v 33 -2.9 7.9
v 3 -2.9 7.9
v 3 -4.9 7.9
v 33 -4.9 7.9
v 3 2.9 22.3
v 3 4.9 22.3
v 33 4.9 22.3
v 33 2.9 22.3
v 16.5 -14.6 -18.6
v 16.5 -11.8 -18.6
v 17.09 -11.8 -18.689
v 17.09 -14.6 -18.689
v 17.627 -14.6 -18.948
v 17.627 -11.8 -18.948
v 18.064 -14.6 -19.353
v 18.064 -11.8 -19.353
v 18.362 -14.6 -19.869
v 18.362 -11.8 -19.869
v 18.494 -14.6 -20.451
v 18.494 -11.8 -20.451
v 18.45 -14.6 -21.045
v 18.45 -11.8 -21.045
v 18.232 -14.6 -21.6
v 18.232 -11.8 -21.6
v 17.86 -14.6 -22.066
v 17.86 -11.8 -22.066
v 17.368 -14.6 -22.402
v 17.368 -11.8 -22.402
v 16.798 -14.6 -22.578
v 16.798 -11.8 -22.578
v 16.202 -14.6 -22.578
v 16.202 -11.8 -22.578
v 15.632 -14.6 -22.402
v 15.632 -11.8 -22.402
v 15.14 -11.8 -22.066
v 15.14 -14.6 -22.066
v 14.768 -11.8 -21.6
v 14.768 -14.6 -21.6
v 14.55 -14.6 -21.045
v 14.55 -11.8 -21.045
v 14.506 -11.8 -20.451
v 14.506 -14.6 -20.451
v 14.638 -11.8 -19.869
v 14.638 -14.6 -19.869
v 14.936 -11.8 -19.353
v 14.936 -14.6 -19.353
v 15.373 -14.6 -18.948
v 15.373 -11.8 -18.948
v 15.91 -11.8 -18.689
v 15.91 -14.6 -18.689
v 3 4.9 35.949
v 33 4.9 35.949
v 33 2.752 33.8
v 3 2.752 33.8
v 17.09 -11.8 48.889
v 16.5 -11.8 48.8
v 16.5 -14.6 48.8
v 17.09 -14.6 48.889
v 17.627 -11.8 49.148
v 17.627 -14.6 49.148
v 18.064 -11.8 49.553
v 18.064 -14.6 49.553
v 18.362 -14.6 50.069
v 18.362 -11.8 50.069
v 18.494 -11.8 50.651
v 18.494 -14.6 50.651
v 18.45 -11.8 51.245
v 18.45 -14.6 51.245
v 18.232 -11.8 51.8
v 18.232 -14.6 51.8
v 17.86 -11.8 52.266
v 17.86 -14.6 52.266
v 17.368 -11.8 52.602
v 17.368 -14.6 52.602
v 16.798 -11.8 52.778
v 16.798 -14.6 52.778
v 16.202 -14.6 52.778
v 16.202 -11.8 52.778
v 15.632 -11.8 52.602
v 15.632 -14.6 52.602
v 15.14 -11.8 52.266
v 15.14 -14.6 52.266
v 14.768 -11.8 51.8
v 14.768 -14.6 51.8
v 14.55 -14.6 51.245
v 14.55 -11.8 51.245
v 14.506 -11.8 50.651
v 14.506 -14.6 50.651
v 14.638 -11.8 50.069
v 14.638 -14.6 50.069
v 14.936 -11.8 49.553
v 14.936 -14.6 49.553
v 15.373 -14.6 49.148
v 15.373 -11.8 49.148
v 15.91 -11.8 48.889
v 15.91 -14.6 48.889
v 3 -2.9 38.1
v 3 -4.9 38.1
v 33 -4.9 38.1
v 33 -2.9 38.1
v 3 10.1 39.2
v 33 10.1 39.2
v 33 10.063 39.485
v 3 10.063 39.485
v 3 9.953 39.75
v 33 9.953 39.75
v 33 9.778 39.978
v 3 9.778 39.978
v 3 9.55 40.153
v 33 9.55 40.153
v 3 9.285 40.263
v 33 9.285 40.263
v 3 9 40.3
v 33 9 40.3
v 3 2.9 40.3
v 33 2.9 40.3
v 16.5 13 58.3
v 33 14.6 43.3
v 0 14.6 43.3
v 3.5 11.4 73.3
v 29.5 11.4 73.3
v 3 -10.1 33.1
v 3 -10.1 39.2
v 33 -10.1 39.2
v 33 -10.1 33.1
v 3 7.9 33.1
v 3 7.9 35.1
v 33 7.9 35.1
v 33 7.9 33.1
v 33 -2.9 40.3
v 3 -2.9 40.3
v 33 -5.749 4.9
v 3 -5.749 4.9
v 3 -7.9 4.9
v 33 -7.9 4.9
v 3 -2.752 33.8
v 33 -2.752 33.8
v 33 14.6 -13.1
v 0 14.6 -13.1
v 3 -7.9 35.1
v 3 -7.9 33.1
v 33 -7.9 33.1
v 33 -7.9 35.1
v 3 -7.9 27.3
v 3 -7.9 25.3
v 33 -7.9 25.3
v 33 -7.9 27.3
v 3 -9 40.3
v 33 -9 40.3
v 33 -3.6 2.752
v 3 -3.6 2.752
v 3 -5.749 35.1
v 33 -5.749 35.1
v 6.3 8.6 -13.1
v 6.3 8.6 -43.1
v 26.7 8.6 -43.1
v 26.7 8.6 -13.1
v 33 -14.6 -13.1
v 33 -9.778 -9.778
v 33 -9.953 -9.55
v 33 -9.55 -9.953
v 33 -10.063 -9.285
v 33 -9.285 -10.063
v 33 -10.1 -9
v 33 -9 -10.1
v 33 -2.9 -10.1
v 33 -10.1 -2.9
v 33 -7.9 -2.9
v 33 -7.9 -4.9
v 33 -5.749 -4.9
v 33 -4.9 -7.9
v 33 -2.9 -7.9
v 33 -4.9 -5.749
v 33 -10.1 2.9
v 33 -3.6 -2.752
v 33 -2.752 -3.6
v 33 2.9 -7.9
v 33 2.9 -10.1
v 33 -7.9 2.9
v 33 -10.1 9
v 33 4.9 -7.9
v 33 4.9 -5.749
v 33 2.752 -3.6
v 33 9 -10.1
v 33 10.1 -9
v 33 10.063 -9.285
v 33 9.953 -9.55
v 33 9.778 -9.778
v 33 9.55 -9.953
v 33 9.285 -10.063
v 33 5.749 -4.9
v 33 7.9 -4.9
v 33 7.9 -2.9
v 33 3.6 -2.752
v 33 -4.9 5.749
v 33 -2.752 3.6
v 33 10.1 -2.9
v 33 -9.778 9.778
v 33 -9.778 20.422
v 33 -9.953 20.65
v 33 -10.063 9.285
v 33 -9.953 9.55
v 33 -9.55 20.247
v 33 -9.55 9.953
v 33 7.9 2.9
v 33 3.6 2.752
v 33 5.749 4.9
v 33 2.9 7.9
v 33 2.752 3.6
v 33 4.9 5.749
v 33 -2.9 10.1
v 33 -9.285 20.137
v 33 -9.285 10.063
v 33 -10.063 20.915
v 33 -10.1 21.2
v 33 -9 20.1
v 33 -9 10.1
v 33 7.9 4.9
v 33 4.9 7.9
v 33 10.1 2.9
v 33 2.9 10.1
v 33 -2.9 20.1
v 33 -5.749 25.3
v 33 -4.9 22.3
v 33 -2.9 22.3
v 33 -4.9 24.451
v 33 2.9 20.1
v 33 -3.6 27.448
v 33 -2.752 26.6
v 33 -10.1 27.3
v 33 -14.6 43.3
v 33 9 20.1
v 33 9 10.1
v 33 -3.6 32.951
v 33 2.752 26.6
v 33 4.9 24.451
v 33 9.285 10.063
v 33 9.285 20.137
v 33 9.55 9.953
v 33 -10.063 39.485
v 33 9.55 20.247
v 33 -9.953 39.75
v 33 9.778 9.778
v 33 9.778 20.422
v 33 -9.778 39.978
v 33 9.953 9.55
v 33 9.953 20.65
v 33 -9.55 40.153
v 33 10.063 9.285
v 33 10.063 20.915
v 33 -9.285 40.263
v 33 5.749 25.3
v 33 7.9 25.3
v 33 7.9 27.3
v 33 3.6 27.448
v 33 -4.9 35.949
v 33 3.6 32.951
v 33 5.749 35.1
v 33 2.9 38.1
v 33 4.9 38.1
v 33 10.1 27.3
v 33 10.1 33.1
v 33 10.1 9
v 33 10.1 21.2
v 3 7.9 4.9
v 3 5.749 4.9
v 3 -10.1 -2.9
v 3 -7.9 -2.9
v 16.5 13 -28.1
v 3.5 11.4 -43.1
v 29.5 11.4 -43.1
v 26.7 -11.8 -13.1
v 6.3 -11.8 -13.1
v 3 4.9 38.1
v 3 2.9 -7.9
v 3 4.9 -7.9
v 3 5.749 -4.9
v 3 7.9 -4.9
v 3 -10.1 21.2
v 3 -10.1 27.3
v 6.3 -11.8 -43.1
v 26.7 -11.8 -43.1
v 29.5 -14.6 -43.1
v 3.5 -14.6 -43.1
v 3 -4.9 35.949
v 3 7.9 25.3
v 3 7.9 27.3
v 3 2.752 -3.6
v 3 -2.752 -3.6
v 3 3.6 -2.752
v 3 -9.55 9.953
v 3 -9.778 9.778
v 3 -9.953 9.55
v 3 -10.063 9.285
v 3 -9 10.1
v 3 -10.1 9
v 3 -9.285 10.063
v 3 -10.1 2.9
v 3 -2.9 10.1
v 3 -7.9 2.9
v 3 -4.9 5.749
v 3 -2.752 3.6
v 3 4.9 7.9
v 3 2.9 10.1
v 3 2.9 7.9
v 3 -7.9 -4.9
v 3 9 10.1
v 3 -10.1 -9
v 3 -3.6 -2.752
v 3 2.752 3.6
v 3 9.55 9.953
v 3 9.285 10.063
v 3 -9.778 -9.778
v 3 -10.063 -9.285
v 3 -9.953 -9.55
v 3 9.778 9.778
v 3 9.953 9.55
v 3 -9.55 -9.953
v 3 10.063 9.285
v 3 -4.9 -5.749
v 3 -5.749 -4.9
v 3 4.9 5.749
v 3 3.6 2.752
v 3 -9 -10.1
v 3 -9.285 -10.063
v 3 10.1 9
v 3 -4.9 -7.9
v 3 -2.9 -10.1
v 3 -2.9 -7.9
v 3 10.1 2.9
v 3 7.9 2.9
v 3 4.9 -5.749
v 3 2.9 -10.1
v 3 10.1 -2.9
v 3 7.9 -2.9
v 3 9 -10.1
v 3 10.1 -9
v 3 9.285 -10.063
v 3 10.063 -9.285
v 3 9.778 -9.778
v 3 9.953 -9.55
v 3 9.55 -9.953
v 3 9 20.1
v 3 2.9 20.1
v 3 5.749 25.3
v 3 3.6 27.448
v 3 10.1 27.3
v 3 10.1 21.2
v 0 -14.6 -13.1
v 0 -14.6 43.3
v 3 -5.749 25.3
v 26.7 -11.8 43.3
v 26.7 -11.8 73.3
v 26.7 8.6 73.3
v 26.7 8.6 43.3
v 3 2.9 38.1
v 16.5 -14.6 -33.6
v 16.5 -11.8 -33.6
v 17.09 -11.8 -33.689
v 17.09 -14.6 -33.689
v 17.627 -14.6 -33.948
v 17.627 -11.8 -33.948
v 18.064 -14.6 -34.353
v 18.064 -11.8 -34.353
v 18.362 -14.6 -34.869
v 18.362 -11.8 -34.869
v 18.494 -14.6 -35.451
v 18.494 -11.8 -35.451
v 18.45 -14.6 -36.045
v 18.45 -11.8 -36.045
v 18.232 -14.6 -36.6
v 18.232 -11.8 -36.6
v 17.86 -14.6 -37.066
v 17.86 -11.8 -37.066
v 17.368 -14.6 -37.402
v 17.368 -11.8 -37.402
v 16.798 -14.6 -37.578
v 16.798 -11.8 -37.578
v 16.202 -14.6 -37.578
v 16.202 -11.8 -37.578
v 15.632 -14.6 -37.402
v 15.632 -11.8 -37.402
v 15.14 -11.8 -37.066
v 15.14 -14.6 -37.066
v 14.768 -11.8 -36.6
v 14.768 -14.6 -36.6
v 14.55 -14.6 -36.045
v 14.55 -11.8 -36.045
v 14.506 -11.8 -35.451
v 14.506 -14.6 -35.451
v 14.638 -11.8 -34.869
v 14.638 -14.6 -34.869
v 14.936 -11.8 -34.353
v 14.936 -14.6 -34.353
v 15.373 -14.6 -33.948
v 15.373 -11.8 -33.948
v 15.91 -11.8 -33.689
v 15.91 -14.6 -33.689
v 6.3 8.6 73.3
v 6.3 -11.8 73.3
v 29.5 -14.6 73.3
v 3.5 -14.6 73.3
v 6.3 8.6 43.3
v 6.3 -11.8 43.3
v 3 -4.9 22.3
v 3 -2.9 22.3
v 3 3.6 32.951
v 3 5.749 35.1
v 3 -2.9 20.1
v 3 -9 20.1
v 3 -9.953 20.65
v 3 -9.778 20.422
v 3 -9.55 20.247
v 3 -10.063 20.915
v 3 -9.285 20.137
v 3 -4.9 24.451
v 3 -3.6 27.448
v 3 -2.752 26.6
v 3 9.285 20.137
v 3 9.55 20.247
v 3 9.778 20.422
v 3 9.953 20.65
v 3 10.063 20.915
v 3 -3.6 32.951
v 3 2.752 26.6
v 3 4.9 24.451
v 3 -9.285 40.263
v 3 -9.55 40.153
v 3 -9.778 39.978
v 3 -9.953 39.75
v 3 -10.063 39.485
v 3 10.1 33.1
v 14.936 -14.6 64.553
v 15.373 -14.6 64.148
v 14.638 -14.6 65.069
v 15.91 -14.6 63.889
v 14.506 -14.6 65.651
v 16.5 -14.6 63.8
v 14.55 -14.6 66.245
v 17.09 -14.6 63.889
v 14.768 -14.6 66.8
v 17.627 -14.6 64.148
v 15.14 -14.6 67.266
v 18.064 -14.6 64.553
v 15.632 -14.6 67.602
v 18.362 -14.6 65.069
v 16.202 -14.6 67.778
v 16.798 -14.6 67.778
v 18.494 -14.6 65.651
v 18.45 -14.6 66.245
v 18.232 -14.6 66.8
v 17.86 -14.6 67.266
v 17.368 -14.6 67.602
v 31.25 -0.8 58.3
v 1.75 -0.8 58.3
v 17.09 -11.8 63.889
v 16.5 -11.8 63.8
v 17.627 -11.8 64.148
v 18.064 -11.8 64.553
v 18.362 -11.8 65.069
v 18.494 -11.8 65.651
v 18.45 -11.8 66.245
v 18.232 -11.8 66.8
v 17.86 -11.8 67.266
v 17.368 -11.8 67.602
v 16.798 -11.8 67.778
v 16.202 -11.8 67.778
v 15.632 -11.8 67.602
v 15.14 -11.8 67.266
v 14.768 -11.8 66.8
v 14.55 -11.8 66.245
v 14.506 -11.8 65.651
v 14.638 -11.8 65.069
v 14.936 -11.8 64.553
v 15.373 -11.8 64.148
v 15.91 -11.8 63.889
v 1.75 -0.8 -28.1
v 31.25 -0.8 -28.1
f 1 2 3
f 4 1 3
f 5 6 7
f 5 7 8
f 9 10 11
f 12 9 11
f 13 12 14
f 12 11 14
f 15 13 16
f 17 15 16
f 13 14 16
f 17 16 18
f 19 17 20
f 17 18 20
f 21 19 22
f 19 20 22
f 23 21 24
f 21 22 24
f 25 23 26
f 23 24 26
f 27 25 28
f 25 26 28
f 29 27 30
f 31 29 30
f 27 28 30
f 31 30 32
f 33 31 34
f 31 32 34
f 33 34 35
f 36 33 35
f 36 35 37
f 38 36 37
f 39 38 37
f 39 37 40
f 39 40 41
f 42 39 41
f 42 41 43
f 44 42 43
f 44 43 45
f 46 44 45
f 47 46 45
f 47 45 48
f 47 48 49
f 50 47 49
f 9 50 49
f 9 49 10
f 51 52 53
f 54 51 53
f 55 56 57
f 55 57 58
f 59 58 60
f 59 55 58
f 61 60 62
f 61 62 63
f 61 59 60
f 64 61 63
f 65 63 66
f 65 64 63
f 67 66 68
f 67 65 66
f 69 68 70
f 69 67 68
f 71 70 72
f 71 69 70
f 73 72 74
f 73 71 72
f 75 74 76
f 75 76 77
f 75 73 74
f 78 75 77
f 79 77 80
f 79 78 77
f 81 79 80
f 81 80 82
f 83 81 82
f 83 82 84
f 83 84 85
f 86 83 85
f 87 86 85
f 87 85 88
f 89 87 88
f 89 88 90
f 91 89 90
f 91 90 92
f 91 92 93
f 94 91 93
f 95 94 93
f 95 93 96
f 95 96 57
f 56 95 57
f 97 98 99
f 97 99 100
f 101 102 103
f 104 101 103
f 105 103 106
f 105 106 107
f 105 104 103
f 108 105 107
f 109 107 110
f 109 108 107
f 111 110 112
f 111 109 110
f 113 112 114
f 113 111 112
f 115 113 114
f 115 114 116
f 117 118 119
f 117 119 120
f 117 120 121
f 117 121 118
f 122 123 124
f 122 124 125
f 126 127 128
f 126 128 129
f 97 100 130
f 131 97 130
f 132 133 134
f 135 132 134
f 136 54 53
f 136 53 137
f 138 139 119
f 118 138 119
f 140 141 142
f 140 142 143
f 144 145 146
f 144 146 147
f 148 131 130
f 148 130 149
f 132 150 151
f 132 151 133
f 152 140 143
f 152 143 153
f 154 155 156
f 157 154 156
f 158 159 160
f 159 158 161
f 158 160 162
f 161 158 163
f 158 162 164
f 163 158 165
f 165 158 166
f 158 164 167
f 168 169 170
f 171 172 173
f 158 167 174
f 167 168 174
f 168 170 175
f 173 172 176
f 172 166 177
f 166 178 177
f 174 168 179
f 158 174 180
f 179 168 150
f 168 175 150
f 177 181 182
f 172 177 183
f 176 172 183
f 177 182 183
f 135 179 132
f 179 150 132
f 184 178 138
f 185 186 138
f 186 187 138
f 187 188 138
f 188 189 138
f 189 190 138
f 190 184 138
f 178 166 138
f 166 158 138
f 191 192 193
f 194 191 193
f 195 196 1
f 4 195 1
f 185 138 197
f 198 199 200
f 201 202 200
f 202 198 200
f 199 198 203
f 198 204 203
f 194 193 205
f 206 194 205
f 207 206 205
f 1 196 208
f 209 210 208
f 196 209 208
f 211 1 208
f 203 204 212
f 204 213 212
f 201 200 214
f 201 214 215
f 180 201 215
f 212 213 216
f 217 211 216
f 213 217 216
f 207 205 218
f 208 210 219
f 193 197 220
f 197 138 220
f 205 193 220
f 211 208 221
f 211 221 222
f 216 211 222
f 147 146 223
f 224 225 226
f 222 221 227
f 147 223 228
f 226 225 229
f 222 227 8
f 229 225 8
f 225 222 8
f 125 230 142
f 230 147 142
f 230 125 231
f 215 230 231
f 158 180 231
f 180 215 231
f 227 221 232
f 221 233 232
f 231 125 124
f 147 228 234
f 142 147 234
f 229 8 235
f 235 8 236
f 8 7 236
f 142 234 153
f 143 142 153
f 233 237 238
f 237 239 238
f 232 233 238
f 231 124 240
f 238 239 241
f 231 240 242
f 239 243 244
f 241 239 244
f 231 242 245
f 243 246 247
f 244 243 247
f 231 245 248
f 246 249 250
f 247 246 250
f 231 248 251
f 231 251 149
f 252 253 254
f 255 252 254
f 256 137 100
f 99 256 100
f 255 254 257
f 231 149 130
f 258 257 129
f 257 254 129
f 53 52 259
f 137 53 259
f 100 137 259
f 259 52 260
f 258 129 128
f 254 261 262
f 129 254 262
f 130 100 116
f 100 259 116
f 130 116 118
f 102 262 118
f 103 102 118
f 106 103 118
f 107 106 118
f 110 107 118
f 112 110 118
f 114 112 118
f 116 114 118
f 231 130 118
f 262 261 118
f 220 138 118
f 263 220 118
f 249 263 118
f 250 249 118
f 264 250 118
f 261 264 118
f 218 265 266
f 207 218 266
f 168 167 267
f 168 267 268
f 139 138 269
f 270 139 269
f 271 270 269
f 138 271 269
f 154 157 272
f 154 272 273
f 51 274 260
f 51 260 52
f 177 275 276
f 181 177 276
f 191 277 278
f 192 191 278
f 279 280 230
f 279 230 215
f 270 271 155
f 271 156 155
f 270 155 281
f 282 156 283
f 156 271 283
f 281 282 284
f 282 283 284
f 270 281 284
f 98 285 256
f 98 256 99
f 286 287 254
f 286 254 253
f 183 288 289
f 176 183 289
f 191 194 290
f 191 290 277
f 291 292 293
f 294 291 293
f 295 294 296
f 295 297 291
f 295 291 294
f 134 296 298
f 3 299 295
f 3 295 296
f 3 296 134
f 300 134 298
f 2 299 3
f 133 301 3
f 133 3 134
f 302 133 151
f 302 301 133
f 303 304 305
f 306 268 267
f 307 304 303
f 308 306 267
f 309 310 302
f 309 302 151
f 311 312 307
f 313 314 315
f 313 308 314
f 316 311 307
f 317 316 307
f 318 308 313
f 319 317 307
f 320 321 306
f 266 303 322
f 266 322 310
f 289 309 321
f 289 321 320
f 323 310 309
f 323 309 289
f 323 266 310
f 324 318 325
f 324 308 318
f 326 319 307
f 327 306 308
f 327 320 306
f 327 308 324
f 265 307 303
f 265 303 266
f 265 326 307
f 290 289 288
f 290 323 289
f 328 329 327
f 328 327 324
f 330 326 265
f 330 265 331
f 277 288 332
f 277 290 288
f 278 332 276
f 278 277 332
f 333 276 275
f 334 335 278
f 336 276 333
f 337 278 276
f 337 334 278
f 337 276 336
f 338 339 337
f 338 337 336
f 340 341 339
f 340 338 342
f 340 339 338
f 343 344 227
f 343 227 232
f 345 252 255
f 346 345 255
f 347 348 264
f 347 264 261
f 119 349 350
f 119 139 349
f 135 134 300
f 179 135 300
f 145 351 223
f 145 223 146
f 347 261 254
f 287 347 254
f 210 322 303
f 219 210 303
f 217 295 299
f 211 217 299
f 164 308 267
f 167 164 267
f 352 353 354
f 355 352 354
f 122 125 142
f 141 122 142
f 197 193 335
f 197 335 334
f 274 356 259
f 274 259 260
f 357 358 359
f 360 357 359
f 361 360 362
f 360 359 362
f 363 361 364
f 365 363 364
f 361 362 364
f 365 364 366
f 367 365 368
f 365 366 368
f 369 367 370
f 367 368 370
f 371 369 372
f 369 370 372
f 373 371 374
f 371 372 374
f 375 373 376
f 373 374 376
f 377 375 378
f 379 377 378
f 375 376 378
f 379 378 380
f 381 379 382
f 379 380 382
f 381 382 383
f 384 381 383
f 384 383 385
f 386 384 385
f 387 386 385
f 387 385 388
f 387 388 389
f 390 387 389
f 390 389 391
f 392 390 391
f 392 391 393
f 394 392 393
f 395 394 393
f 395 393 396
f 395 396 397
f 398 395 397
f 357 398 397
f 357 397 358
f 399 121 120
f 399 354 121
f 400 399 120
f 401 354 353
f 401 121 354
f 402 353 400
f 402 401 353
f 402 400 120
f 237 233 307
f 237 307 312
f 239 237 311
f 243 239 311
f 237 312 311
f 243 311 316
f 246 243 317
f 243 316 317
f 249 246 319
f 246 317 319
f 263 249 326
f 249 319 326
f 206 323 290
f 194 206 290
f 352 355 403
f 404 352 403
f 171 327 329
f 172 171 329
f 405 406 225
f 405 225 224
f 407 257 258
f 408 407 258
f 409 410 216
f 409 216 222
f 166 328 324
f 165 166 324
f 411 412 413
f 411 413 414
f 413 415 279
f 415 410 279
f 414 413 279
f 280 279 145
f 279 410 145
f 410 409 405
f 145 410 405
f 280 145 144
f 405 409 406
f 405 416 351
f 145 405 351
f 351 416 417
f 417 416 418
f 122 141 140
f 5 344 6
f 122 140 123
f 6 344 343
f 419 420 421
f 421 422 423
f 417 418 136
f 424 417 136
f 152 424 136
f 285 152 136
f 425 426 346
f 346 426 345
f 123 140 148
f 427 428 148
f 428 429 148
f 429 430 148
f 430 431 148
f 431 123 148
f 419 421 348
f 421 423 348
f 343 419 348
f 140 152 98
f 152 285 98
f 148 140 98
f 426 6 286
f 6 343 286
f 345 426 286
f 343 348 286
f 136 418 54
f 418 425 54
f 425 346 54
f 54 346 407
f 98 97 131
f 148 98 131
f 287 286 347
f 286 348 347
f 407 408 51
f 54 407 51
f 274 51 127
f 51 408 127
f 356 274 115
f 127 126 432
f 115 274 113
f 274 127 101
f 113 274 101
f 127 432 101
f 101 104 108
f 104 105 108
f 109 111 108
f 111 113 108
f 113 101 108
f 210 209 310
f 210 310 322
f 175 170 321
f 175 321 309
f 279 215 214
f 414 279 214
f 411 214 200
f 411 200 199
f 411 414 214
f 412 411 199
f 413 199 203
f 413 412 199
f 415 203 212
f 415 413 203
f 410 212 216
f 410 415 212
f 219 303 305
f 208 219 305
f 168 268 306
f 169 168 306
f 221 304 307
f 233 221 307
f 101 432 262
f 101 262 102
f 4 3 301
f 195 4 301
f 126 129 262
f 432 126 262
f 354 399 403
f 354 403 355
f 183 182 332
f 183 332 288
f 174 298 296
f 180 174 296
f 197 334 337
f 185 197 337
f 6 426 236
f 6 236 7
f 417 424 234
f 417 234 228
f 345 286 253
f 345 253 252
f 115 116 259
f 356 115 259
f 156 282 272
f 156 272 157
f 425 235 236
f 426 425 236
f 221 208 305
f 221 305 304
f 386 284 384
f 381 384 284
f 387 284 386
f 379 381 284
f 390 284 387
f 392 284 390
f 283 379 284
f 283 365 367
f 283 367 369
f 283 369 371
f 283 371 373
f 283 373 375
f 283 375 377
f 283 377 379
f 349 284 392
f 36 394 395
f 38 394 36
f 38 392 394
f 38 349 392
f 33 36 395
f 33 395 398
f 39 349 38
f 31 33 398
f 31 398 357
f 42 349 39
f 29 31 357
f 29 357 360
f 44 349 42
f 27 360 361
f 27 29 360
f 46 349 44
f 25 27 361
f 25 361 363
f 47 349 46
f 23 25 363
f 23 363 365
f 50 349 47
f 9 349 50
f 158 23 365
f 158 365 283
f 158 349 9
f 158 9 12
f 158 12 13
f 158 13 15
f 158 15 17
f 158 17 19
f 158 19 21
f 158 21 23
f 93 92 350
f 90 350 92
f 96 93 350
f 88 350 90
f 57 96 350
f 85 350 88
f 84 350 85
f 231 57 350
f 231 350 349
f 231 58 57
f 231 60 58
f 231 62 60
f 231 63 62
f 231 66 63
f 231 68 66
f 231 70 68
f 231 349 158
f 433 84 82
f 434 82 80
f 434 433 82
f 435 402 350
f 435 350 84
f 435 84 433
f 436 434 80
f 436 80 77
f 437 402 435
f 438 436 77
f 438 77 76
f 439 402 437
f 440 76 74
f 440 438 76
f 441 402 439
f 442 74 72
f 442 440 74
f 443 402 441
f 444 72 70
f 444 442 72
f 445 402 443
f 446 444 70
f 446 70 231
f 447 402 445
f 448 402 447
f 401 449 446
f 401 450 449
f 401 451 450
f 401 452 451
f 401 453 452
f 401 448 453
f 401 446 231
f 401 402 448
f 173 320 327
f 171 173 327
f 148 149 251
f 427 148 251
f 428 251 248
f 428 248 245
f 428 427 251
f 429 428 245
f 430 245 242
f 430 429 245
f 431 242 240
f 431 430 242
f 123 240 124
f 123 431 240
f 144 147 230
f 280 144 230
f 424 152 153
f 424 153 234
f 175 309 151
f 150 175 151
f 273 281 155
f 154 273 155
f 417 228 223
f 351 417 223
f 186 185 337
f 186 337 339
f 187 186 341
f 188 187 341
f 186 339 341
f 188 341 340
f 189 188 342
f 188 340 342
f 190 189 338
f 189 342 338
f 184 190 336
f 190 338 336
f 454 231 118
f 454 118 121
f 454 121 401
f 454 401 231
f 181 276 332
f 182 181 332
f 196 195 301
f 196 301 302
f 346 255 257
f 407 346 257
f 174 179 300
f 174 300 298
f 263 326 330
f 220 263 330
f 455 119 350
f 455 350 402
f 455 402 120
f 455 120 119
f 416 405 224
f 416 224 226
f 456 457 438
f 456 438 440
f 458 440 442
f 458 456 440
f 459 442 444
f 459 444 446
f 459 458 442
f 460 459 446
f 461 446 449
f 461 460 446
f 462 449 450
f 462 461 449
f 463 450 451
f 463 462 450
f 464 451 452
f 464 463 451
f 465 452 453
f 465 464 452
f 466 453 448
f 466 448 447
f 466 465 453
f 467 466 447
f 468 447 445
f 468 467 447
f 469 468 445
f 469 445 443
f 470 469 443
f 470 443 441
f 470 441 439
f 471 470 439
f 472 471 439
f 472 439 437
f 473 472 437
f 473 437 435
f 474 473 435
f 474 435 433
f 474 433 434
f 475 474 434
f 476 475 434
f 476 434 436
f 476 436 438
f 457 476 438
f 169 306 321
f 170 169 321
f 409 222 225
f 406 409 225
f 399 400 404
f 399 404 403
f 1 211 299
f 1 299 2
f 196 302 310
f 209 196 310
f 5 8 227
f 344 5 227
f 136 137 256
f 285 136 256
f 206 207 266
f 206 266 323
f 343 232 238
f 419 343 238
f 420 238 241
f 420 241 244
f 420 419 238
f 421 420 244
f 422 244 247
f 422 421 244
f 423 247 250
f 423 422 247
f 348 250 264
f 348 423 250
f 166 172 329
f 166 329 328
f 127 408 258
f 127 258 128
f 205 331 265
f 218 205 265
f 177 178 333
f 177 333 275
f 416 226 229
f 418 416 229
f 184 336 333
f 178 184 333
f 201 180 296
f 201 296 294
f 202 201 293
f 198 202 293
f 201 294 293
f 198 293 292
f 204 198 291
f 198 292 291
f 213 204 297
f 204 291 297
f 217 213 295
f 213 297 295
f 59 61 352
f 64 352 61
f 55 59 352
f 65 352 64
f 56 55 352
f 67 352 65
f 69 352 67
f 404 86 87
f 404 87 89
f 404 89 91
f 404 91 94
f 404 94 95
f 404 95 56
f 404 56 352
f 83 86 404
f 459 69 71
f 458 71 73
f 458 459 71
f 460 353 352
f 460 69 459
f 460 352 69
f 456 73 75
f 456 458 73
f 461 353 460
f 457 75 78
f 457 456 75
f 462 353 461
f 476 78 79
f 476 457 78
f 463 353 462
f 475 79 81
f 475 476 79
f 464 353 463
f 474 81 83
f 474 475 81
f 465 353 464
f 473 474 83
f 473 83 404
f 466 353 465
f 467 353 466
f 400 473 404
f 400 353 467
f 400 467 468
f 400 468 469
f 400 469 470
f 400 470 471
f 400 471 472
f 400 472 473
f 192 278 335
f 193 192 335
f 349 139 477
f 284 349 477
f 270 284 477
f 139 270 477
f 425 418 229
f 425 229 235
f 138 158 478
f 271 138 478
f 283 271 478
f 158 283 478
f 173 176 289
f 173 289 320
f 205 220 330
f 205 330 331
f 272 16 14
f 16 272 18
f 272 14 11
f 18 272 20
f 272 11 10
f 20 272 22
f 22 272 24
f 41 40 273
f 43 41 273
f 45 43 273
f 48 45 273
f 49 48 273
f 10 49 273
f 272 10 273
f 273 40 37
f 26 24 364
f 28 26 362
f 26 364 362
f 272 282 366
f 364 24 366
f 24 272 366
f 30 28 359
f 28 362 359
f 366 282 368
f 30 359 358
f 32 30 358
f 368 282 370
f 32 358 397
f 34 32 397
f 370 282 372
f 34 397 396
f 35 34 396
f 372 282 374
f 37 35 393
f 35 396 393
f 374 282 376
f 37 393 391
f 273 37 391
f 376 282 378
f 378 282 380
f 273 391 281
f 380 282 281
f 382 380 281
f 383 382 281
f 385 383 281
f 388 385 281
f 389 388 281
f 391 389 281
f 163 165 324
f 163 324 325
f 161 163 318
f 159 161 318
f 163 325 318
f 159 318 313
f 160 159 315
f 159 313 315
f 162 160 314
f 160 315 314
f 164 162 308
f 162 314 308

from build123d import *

# Parameters (mm, degrees)
SKETCH3_W           = 28.2
SKETCH3_H           = 29.2
BOSS_EXTRUDE1_DEPTH = 3
BOSS_EXTRUDE2_START = 3
SKETCH3_3_W         = 28.2
SKETCH3_3_H         = 29.2
BOSS_EXTRUDE2_DEPTH = 30
SKETCH6_4_W         = 10.2
SKETCH6_4_H         = 20.4
CUT_EXTRUDE2_DEPTH  = 30
SKETCH8_R           = 2
CUT_EXTRUDE3_DEPTH  = 30


with BuildPart() as part:
    # Sketch3 → Boss-Extrude1 (new body)
    with BuildSketch(Plane(origin=(0, 0, 0), x_dir=(0, 0, -1), z_dir=(1, 0, 0))):
        with Locations((-1, 0)):
            Rectangle(SKETCH3_W, SKETCH3_H)
    extrude(amount=BOSS_EXTRUDE1_DEPTH)

    # Sketch3<3> → Boss-Extrude2 (add)
    with BuildSketch(Plane(origin=(0, 0, 0), x_dir=(0, 0, -1), z_dir=(1, 0, 0)).offset(BOSS_EXTRUDE2_START)):
        with Locations((-1, 0)):
            Rectangle(SKETCH3_3_W, SKETCH3_3_H)
        with BuildLine():
            Line((-10.1, 2.9), (-10.1, 9))
            ThreePointArc((-10.1, 9), (-9.777817459, 9.777817459), (-9, 10.1))
            Line((-9, 10.1), (-2.9, 10.1))
            Line((-2.9, 10.1), (-2.9, 7.9))
            Line((-2.9, 7.9), (-4.9, 7.9))
            Line((-4.9, 7.9), (-4.9, 5.749))
            Line((-4.9, 5.749), (-2.7515, 3.6005))
            Line((-2.7515, 3.6005), (2.7515, 3.6005))
            Line((2.7515, 3.6005), (4.9, 5.749))
            Line((4.9, 5.749), (4.9, 7.9))
            Line((4.9, 7.9), (2.9, 7.9))
            Line((2.9, 7.9), (2.9, 10.1))
            Line((2.9, 10.1), (9, 10.1))
            ThreePointArc((9, 10.1), (9.777817459, 9.777817459), (10.1, 9))
            Line((10.1, 9), (10.1, 2.9))
            Line((10.1, 2.9), (7.9, 2.9))
            Line((7.9, 2.9), (7.9, 4.9))
            Line((7.9, 4.9), (5.749, 4.9))
            Line((5.749, 4.9), (3.6005, 2.7515))
            Line((3.6005, 2.7515), (3.6005, -2.7515))
            Line((3.6005, -2.7515), (5.749, -4.9))
            Line((5.749, -4.9), (7.9, -4.9))
            Line((7.9, -4.9), (7.9, -2.9))
            Line((7.9, -2.9), (10.1, -2.9))
            Line((10.1, -2.9), (10.1, -9))
            ThreePointArc((10.1, -9), (9.777817459, -9.777817459), (9, -10.1))
            Line((9, -10.1), (2.9, -10.1))
            Line((2.9, -10.1), (2.9, -7.9))
            Line((2.9, -7.9), (4.9, -7.9))
            Line((4.9, -7.9), (4.9, -5.749))
            Line((4.9, -5.749), (2.7515, -3.6005))
            Line((2.7515, -3.6005), (-2.7515, -3.6005))
            Line((-2.7515, -3.6005), (-4.9, -5.749))
            Line((-4.9, -5.749), (-4.9, -7.9))
            Line((-4.9, -7.9), (-2.9, -7.9))
            Line((-2.9, -7.9), (-2.9, -10.1))
            Line((-2.9, -10.1), (-9, -10.1))
            ThreePointArc((-9, -10.1), (-9.777817459, -9.777817459), (-10.1, -9))
            Line((-10.1, -9), (-10.1, -2.9))
            Line((-10.1, -2.9), (-7.9, -2.9))
            Line((-7.9, -2.9), (-7.9, -4.9))
            Line((-7.9, -4.9), (-5.749, -4.9))
            Line((-5.749, -4.9), (-3.6005, -2.7515))
            Line((-3.6005, -2.7515), (-3.6005, 2.7515))
            Line((-3.6005, 2.7515), (-5.749, 4.9))
            Line((-5.749, 4.9), (-7.9, 4.9))
            Line((-7.9, 4.9), (-7.9, 2.9))
            Line((-7.9, 2.9), (-10.1, 2.9))
        make_face(mode=Mode.SUBTRACT)
    extrude(amount=BOSS_EXTRUDE2_DEPTH)

    # Sketch6 → section 1 of loft2
    with BuildSketch(Plane(origin=(0, 0, -43.1), x_dir=(-1, 0, 0), z_dir=(0, 0, -1)), mode=Mode.PRIVATE) as loft2_s1:
        with BuildLine():
            Line((-29.5, -14.6), (-3.5, -14.6))
            Line((-3.5, -14.6), (-3.5, 11.4))
            Line((-3.5, 11.4), (-29.5, 11.4))
            Line((-29.5, 11.4), (-29.5, -14.6))
        make_face()
    # loft from a face of the part (loft2)
    loft([part.faces().sort_by_distance((16.5, 0, -13.1))[0], loft2_s1.sketch])

    # Sketch6<4> → Cut-Extrude2 (cut)
    with BuildSketch(Plane(origin=(0, 0, -43.1), x_dir=(-1, 0, 0), z_dir=(0, 0, -1))):
        with Locations((-21.6, -1.6)):
            Rectangle(SKETCH6_4_W, SKETCH6_4_H)
        with Locations((-11.4, -1.6)):
            Rectangle(SKETCH6_4_W, SKETCH6_4_H)
    extrude(amount=-CUT_EXTRUDE2_DEPTH, mode=Mode.SUBTRACT)

    # Sketch8 → Cut-Extrude3 (cut)
    with BuildSketch(Plane(origin=(0, -11.8, 0), x_dir=(1, 0, 0), z_dir=(0, 1, 0))):
        with Locations(Location((16.5, 35.6, 0), (0, 0, 270))):
            Circle(SKETCH8_R)
        with Locations(Location((16.5, 20.6, 0), (0, 0, 270))):
            Circle(SKETCH8_R)
    extrude(amount=-CUT_EXTRUDE3_DEPTH, mode=Mode.SUBTRACT)

    # Mirror2: part across plane


with BuildPart() as part_1:
    add(part.part)
    add(part.part.mirror(Plane(origin=(3, 0, 15.1), x_dir=(1, 0, 0), z_dir=(0, 0, -1))))


solid = part_1.part
